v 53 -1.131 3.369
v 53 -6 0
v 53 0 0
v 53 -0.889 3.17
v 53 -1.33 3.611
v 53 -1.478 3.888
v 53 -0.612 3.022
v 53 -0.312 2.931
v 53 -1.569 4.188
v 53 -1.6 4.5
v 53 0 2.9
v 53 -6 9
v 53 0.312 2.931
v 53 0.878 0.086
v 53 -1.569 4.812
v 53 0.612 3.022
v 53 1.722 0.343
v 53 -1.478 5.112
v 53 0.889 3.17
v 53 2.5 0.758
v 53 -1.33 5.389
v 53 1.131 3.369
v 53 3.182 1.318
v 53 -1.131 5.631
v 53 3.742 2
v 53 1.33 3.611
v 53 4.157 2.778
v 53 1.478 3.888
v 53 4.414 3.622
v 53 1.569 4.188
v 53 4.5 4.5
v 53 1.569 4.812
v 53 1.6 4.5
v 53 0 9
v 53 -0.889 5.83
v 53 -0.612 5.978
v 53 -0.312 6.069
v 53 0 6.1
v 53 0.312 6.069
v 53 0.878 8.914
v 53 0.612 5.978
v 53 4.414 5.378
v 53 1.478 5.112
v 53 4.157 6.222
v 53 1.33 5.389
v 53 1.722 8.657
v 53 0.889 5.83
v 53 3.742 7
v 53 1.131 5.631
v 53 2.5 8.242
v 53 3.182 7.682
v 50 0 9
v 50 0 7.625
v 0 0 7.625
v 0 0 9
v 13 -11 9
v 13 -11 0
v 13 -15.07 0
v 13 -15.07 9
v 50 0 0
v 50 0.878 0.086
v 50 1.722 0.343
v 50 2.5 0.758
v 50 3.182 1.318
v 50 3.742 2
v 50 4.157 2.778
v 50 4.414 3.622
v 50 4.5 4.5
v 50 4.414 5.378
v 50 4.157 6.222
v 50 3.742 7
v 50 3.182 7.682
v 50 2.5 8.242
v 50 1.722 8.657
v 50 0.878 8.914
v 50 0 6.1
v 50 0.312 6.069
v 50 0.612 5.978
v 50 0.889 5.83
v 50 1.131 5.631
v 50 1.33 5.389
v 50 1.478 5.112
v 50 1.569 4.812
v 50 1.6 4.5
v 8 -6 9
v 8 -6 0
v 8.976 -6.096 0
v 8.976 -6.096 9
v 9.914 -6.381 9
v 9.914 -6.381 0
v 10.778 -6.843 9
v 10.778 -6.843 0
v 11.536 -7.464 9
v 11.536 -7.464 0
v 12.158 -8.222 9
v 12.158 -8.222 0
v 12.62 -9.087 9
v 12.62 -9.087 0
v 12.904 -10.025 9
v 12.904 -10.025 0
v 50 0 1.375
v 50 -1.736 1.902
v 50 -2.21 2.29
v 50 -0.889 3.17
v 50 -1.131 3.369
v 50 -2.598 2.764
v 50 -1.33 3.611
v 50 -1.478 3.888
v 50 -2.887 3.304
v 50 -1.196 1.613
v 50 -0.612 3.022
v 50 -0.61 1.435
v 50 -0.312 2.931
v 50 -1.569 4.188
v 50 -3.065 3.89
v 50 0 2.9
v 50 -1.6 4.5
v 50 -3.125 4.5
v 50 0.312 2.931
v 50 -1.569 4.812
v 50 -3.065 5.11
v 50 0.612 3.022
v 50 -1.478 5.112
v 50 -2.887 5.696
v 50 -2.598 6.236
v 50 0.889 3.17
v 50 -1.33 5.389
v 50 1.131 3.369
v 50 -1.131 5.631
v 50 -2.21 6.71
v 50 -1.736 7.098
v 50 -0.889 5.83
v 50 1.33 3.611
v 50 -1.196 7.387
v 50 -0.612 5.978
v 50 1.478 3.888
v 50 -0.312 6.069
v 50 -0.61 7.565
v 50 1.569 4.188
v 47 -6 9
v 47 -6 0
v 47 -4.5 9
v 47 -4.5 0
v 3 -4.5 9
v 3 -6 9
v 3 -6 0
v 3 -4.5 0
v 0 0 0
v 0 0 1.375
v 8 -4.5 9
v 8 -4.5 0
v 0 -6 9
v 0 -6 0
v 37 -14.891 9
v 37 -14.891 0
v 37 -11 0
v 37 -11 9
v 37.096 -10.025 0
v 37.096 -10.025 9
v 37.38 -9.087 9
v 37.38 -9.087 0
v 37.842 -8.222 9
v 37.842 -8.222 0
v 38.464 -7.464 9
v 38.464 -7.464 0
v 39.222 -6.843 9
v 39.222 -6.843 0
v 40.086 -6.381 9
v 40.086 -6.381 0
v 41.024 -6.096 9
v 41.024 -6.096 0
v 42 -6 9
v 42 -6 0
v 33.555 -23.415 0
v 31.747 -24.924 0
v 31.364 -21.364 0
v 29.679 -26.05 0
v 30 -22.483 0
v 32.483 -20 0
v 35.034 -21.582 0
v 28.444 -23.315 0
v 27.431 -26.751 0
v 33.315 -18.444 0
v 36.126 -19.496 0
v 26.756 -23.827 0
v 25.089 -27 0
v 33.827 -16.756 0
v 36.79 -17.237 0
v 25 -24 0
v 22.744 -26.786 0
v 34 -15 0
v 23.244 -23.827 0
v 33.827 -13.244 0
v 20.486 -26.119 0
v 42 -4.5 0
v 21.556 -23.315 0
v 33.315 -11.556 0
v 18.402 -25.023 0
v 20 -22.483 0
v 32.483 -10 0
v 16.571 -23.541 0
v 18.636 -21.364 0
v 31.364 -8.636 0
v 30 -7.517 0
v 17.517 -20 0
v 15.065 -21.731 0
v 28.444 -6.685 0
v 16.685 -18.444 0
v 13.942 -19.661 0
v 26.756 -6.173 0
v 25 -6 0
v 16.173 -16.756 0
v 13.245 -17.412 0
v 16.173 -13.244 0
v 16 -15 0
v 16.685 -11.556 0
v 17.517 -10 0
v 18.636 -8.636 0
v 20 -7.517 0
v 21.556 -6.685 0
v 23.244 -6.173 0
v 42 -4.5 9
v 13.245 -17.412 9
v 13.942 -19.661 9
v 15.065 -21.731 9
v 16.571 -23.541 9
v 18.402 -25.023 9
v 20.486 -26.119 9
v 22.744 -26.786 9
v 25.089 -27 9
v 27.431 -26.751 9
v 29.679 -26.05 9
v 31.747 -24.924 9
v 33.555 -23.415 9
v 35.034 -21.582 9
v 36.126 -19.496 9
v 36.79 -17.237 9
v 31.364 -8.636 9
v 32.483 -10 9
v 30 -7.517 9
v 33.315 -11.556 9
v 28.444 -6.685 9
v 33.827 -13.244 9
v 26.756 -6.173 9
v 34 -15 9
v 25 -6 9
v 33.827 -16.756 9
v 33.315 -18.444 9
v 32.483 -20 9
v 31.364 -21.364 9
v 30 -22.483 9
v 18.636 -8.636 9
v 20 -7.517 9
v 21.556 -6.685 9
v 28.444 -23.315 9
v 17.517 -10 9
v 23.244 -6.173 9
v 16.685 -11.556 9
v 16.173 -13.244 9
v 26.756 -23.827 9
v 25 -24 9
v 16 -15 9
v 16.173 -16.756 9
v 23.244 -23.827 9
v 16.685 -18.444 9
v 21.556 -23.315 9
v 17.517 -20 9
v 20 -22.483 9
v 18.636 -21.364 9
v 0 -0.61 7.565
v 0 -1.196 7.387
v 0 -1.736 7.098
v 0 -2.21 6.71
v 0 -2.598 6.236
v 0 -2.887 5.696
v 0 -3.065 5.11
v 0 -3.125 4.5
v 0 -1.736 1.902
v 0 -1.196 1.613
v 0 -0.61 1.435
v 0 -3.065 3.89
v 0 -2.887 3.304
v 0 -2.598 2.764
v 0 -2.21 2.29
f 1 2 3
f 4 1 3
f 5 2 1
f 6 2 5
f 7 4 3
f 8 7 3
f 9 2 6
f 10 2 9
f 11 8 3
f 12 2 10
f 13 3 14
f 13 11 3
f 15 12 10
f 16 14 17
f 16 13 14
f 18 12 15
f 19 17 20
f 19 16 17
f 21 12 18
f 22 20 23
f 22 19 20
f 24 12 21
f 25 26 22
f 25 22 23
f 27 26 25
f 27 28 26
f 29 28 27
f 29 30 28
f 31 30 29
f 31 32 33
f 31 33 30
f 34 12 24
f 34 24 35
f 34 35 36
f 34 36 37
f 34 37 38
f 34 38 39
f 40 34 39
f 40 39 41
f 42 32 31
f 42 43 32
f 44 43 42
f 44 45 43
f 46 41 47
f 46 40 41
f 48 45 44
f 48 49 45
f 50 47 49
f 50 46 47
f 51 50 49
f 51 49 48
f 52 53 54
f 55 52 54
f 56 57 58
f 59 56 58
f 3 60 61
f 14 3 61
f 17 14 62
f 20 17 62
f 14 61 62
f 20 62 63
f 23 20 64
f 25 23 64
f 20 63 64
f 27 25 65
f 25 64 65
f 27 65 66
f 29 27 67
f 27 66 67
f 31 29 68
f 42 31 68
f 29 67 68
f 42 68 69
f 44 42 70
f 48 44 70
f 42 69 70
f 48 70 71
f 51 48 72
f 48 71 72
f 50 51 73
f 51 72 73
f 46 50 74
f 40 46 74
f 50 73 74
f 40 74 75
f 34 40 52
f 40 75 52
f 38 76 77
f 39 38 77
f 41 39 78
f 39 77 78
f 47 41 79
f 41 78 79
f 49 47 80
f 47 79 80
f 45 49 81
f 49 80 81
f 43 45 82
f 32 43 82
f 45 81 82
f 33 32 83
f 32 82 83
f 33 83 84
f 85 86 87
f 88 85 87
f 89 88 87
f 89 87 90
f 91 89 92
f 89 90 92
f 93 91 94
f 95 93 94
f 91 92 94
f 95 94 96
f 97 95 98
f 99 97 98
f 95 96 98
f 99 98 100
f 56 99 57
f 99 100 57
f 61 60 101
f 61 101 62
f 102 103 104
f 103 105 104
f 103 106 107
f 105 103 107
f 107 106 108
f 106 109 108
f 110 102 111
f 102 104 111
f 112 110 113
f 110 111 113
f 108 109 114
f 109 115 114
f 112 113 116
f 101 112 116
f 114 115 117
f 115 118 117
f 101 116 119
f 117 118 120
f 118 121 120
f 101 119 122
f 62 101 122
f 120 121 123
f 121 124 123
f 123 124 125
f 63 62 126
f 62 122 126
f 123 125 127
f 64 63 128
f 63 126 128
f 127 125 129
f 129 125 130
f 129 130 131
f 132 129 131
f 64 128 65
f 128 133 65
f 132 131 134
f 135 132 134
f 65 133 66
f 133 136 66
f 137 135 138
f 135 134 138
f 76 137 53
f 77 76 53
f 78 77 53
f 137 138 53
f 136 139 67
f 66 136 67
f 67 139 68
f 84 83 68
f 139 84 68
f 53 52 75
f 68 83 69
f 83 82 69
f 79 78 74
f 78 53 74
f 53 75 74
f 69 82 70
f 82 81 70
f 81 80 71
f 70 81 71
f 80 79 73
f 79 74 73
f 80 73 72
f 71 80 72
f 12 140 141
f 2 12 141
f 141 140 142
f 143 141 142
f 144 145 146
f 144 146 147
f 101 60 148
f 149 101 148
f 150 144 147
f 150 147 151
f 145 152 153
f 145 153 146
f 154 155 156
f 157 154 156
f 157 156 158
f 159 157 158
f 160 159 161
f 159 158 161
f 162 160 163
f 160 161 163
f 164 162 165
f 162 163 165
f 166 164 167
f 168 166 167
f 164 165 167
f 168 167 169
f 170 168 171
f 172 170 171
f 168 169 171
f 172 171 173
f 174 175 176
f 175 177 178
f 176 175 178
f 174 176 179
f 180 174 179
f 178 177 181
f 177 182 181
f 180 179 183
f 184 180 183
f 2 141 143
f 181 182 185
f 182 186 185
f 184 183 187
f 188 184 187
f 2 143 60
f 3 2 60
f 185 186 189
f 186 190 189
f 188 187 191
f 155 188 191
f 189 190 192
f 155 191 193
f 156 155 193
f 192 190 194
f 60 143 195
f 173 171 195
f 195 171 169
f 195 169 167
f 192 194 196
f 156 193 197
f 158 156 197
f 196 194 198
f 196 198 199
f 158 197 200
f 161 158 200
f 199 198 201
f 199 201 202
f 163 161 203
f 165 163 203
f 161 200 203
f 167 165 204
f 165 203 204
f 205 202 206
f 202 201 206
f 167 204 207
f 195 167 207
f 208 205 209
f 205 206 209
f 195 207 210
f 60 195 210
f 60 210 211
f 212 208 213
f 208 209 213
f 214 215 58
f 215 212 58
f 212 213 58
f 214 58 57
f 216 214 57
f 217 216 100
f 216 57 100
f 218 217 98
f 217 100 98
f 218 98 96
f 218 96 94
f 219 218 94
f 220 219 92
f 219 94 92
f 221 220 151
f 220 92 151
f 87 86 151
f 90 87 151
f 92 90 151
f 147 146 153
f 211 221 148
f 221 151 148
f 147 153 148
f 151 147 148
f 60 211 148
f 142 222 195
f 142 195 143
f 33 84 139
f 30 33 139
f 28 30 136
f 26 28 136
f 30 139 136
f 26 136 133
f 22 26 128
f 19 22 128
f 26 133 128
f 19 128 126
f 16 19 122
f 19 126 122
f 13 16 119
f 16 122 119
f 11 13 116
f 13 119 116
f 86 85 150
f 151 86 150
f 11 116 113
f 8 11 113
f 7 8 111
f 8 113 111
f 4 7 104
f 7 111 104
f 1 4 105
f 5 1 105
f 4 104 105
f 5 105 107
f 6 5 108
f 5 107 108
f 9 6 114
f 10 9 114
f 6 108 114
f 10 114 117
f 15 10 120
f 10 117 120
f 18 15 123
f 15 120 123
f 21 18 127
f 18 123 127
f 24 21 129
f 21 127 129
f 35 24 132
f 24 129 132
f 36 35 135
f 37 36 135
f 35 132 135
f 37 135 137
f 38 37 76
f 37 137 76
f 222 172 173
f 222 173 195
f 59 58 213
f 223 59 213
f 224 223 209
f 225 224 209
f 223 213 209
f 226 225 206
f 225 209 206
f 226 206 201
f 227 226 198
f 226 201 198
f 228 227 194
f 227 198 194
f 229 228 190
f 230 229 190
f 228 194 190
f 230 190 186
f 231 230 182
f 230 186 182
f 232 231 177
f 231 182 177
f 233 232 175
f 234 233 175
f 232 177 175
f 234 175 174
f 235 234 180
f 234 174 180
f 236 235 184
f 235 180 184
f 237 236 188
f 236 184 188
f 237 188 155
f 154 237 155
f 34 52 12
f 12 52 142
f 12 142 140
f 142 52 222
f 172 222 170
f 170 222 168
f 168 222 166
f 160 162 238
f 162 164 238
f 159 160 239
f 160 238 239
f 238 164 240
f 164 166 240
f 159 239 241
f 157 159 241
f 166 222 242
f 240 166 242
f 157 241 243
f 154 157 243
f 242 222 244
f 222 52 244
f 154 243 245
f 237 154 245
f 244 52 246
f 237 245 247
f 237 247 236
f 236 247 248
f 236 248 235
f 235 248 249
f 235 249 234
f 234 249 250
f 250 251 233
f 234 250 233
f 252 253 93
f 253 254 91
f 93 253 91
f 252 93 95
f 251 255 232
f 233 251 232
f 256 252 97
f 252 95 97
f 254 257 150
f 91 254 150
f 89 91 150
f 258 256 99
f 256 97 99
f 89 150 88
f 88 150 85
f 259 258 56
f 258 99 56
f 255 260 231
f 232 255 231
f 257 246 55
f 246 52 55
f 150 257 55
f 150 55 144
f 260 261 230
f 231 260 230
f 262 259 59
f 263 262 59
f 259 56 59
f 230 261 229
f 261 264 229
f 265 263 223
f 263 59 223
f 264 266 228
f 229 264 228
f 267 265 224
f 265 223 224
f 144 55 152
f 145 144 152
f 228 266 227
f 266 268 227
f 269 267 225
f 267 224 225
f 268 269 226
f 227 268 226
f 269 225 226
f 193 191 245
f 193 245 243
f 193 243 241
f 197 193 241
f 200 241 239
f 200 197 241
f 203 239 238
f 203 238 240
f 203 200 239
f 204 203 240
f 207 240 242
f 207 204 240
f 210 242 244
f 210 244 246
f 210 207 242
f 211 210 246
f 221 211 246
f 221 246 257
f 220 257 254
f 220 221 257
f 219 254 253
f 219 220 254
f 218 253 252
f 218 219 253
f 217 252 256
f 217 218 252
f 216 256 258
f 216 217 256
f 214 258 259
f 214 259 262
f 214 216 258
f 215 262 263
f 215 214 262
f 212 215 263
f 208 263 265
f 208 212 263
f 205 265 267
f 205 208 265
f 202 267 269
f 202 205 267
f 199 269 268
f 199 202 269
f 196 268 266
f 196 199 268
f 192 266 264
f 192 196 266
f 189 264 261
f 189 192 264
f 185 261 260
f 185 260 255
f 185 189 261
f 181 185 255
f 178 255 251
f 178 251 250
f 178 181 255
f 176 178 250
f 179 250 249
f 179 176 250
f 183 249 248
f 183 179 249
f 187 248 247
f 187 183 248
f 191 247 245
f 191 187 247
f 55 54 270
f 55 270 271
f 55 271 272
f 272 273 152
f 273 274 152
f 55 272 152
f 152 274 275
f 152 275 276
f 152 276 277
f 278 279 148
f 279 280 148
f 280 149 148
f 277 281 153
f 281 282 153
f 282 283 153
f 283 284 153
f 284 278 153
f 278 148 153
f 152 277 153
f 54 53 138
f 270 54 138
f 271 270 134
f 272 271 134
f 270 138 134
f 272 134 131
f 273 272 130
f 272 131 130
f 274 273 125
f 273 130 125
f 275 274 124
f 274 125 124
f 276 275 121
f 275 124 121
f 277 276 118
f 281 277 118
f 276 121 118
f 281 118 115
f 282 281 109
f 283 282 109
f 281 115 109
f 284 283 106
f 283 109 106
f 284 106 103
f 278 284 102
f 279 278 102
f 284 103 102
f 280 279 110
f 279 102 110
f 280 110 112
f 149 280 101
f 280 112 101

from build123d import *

# Parameters (mm, degrees)
F0_R     = 9
F1_DEPTH = 9
F3_DEPTH = 50
F5_DEPTH = 3
F6_W     = 5
F6_H     = 1.5
F7_DEPTH = 25


with BuildPart() as f1:
    # F0 (on Top) → F1 (new body)
    with BuildSketch(Plane.XY):
        with BuildLine():
            Line((50, 0), (0, 0))
            Line((0, 0), (0, -6))
            Line((0, -6), (8.0002032363, -6))
            ThreePointArc((8.0002032363, -6), (11.5357371422, -7.4644660941), (13.0002032363, -11))
            Line((13.0002032363, -11), (13.0002032363, -14.9301599718))
            Line((13.0002032363, -14.9301599718), (13.0002032363, -15.0698400282))
            ThreePointArc((13.0002032363, -15.0698400282), (25.08937552, -26.9996671627), (36.9995057583, -14.8910892252))
            Line((36.9995057583, -14.8910892252), (36.9995057583, -11))
            ThreePointArc((36.9995057583, -11), (38.4639718524, -7.4644660941), (41.9995057583, -6))
            Line((41.9995057583, -6), (50, -6))
            Line((50, -6), (50, 0))
        make_face()
        with Locations((25, -15)):
            Circle(F0_R, mode=Mode.SUBTRACT)
    extrude(amount=F1_DEPTH)

    # F2 (on face) → F3 (cut)
    with BuildSketch(Plane.YZ.offset(50)):
        with BuildLine():
            Line((0, 1.375), (0, 7.625))
            ThreePointArc((0, 7.625), (-3.125, 4.5), (0, 1.375))
        make_face()
    extrude(amount=-F3_DEPTH, mode=Mode.SUBTRACT)

    # F4 (on face) → F5 (join)
    with BuildSketch(Plane.YZ.offset(50)):
        with BuildLine():
            Line((0, 1.375), (0, 0))
            ThreePointArc((0, 0), (4.5, 4.5), (0, 9))
            Line((0, 9), (0, 7.625))
            ThreePointArc((0, 7.625), (-3.125, 4.5), (0, 1.375))
        make_face()
        with BuildLine():
            ThreePointArc((0, 6.1), (1.1313708499, 5.6313708499), (1.6, 4.5))
            ThreePointArc((1.6, 4.5), (1.1313708499, 3.3686291501), (0, 2.9))
            ThreePointArc((0, 2.9), (-1.6, 4.5), (0, 6.1))
        make_face(mode=Mode.SUBTRACT)
        with BuildLine():
            Line((-6, 0), (0, 0))
            Line((0, 0), (0, 1.375))
            ThreePointArc((0, 1.375), (-3.125, 4.5), (0, 7.625))
            Line((0, 7.625), (0, 9))
            Line((0, 9), (-6, 9))
            Line((-6, 9), (-6, 0))
        make_face()
    extrude(amount=F5_DEPTH)

    # F6 (on face) → F7 (cut)
    with BuildSketch(Plane.XY.offset(9)):
        with Locations((5.5, -5.25)):
            Rectangle(F6_W, F6_H)
        with Locations((44.5, -5.25)):
            Rectangle(F6_W, F6_H)
    extrude(amount=-F7_DEPTH, mode=Mode.SUBTRACT)


solid = f1.part
